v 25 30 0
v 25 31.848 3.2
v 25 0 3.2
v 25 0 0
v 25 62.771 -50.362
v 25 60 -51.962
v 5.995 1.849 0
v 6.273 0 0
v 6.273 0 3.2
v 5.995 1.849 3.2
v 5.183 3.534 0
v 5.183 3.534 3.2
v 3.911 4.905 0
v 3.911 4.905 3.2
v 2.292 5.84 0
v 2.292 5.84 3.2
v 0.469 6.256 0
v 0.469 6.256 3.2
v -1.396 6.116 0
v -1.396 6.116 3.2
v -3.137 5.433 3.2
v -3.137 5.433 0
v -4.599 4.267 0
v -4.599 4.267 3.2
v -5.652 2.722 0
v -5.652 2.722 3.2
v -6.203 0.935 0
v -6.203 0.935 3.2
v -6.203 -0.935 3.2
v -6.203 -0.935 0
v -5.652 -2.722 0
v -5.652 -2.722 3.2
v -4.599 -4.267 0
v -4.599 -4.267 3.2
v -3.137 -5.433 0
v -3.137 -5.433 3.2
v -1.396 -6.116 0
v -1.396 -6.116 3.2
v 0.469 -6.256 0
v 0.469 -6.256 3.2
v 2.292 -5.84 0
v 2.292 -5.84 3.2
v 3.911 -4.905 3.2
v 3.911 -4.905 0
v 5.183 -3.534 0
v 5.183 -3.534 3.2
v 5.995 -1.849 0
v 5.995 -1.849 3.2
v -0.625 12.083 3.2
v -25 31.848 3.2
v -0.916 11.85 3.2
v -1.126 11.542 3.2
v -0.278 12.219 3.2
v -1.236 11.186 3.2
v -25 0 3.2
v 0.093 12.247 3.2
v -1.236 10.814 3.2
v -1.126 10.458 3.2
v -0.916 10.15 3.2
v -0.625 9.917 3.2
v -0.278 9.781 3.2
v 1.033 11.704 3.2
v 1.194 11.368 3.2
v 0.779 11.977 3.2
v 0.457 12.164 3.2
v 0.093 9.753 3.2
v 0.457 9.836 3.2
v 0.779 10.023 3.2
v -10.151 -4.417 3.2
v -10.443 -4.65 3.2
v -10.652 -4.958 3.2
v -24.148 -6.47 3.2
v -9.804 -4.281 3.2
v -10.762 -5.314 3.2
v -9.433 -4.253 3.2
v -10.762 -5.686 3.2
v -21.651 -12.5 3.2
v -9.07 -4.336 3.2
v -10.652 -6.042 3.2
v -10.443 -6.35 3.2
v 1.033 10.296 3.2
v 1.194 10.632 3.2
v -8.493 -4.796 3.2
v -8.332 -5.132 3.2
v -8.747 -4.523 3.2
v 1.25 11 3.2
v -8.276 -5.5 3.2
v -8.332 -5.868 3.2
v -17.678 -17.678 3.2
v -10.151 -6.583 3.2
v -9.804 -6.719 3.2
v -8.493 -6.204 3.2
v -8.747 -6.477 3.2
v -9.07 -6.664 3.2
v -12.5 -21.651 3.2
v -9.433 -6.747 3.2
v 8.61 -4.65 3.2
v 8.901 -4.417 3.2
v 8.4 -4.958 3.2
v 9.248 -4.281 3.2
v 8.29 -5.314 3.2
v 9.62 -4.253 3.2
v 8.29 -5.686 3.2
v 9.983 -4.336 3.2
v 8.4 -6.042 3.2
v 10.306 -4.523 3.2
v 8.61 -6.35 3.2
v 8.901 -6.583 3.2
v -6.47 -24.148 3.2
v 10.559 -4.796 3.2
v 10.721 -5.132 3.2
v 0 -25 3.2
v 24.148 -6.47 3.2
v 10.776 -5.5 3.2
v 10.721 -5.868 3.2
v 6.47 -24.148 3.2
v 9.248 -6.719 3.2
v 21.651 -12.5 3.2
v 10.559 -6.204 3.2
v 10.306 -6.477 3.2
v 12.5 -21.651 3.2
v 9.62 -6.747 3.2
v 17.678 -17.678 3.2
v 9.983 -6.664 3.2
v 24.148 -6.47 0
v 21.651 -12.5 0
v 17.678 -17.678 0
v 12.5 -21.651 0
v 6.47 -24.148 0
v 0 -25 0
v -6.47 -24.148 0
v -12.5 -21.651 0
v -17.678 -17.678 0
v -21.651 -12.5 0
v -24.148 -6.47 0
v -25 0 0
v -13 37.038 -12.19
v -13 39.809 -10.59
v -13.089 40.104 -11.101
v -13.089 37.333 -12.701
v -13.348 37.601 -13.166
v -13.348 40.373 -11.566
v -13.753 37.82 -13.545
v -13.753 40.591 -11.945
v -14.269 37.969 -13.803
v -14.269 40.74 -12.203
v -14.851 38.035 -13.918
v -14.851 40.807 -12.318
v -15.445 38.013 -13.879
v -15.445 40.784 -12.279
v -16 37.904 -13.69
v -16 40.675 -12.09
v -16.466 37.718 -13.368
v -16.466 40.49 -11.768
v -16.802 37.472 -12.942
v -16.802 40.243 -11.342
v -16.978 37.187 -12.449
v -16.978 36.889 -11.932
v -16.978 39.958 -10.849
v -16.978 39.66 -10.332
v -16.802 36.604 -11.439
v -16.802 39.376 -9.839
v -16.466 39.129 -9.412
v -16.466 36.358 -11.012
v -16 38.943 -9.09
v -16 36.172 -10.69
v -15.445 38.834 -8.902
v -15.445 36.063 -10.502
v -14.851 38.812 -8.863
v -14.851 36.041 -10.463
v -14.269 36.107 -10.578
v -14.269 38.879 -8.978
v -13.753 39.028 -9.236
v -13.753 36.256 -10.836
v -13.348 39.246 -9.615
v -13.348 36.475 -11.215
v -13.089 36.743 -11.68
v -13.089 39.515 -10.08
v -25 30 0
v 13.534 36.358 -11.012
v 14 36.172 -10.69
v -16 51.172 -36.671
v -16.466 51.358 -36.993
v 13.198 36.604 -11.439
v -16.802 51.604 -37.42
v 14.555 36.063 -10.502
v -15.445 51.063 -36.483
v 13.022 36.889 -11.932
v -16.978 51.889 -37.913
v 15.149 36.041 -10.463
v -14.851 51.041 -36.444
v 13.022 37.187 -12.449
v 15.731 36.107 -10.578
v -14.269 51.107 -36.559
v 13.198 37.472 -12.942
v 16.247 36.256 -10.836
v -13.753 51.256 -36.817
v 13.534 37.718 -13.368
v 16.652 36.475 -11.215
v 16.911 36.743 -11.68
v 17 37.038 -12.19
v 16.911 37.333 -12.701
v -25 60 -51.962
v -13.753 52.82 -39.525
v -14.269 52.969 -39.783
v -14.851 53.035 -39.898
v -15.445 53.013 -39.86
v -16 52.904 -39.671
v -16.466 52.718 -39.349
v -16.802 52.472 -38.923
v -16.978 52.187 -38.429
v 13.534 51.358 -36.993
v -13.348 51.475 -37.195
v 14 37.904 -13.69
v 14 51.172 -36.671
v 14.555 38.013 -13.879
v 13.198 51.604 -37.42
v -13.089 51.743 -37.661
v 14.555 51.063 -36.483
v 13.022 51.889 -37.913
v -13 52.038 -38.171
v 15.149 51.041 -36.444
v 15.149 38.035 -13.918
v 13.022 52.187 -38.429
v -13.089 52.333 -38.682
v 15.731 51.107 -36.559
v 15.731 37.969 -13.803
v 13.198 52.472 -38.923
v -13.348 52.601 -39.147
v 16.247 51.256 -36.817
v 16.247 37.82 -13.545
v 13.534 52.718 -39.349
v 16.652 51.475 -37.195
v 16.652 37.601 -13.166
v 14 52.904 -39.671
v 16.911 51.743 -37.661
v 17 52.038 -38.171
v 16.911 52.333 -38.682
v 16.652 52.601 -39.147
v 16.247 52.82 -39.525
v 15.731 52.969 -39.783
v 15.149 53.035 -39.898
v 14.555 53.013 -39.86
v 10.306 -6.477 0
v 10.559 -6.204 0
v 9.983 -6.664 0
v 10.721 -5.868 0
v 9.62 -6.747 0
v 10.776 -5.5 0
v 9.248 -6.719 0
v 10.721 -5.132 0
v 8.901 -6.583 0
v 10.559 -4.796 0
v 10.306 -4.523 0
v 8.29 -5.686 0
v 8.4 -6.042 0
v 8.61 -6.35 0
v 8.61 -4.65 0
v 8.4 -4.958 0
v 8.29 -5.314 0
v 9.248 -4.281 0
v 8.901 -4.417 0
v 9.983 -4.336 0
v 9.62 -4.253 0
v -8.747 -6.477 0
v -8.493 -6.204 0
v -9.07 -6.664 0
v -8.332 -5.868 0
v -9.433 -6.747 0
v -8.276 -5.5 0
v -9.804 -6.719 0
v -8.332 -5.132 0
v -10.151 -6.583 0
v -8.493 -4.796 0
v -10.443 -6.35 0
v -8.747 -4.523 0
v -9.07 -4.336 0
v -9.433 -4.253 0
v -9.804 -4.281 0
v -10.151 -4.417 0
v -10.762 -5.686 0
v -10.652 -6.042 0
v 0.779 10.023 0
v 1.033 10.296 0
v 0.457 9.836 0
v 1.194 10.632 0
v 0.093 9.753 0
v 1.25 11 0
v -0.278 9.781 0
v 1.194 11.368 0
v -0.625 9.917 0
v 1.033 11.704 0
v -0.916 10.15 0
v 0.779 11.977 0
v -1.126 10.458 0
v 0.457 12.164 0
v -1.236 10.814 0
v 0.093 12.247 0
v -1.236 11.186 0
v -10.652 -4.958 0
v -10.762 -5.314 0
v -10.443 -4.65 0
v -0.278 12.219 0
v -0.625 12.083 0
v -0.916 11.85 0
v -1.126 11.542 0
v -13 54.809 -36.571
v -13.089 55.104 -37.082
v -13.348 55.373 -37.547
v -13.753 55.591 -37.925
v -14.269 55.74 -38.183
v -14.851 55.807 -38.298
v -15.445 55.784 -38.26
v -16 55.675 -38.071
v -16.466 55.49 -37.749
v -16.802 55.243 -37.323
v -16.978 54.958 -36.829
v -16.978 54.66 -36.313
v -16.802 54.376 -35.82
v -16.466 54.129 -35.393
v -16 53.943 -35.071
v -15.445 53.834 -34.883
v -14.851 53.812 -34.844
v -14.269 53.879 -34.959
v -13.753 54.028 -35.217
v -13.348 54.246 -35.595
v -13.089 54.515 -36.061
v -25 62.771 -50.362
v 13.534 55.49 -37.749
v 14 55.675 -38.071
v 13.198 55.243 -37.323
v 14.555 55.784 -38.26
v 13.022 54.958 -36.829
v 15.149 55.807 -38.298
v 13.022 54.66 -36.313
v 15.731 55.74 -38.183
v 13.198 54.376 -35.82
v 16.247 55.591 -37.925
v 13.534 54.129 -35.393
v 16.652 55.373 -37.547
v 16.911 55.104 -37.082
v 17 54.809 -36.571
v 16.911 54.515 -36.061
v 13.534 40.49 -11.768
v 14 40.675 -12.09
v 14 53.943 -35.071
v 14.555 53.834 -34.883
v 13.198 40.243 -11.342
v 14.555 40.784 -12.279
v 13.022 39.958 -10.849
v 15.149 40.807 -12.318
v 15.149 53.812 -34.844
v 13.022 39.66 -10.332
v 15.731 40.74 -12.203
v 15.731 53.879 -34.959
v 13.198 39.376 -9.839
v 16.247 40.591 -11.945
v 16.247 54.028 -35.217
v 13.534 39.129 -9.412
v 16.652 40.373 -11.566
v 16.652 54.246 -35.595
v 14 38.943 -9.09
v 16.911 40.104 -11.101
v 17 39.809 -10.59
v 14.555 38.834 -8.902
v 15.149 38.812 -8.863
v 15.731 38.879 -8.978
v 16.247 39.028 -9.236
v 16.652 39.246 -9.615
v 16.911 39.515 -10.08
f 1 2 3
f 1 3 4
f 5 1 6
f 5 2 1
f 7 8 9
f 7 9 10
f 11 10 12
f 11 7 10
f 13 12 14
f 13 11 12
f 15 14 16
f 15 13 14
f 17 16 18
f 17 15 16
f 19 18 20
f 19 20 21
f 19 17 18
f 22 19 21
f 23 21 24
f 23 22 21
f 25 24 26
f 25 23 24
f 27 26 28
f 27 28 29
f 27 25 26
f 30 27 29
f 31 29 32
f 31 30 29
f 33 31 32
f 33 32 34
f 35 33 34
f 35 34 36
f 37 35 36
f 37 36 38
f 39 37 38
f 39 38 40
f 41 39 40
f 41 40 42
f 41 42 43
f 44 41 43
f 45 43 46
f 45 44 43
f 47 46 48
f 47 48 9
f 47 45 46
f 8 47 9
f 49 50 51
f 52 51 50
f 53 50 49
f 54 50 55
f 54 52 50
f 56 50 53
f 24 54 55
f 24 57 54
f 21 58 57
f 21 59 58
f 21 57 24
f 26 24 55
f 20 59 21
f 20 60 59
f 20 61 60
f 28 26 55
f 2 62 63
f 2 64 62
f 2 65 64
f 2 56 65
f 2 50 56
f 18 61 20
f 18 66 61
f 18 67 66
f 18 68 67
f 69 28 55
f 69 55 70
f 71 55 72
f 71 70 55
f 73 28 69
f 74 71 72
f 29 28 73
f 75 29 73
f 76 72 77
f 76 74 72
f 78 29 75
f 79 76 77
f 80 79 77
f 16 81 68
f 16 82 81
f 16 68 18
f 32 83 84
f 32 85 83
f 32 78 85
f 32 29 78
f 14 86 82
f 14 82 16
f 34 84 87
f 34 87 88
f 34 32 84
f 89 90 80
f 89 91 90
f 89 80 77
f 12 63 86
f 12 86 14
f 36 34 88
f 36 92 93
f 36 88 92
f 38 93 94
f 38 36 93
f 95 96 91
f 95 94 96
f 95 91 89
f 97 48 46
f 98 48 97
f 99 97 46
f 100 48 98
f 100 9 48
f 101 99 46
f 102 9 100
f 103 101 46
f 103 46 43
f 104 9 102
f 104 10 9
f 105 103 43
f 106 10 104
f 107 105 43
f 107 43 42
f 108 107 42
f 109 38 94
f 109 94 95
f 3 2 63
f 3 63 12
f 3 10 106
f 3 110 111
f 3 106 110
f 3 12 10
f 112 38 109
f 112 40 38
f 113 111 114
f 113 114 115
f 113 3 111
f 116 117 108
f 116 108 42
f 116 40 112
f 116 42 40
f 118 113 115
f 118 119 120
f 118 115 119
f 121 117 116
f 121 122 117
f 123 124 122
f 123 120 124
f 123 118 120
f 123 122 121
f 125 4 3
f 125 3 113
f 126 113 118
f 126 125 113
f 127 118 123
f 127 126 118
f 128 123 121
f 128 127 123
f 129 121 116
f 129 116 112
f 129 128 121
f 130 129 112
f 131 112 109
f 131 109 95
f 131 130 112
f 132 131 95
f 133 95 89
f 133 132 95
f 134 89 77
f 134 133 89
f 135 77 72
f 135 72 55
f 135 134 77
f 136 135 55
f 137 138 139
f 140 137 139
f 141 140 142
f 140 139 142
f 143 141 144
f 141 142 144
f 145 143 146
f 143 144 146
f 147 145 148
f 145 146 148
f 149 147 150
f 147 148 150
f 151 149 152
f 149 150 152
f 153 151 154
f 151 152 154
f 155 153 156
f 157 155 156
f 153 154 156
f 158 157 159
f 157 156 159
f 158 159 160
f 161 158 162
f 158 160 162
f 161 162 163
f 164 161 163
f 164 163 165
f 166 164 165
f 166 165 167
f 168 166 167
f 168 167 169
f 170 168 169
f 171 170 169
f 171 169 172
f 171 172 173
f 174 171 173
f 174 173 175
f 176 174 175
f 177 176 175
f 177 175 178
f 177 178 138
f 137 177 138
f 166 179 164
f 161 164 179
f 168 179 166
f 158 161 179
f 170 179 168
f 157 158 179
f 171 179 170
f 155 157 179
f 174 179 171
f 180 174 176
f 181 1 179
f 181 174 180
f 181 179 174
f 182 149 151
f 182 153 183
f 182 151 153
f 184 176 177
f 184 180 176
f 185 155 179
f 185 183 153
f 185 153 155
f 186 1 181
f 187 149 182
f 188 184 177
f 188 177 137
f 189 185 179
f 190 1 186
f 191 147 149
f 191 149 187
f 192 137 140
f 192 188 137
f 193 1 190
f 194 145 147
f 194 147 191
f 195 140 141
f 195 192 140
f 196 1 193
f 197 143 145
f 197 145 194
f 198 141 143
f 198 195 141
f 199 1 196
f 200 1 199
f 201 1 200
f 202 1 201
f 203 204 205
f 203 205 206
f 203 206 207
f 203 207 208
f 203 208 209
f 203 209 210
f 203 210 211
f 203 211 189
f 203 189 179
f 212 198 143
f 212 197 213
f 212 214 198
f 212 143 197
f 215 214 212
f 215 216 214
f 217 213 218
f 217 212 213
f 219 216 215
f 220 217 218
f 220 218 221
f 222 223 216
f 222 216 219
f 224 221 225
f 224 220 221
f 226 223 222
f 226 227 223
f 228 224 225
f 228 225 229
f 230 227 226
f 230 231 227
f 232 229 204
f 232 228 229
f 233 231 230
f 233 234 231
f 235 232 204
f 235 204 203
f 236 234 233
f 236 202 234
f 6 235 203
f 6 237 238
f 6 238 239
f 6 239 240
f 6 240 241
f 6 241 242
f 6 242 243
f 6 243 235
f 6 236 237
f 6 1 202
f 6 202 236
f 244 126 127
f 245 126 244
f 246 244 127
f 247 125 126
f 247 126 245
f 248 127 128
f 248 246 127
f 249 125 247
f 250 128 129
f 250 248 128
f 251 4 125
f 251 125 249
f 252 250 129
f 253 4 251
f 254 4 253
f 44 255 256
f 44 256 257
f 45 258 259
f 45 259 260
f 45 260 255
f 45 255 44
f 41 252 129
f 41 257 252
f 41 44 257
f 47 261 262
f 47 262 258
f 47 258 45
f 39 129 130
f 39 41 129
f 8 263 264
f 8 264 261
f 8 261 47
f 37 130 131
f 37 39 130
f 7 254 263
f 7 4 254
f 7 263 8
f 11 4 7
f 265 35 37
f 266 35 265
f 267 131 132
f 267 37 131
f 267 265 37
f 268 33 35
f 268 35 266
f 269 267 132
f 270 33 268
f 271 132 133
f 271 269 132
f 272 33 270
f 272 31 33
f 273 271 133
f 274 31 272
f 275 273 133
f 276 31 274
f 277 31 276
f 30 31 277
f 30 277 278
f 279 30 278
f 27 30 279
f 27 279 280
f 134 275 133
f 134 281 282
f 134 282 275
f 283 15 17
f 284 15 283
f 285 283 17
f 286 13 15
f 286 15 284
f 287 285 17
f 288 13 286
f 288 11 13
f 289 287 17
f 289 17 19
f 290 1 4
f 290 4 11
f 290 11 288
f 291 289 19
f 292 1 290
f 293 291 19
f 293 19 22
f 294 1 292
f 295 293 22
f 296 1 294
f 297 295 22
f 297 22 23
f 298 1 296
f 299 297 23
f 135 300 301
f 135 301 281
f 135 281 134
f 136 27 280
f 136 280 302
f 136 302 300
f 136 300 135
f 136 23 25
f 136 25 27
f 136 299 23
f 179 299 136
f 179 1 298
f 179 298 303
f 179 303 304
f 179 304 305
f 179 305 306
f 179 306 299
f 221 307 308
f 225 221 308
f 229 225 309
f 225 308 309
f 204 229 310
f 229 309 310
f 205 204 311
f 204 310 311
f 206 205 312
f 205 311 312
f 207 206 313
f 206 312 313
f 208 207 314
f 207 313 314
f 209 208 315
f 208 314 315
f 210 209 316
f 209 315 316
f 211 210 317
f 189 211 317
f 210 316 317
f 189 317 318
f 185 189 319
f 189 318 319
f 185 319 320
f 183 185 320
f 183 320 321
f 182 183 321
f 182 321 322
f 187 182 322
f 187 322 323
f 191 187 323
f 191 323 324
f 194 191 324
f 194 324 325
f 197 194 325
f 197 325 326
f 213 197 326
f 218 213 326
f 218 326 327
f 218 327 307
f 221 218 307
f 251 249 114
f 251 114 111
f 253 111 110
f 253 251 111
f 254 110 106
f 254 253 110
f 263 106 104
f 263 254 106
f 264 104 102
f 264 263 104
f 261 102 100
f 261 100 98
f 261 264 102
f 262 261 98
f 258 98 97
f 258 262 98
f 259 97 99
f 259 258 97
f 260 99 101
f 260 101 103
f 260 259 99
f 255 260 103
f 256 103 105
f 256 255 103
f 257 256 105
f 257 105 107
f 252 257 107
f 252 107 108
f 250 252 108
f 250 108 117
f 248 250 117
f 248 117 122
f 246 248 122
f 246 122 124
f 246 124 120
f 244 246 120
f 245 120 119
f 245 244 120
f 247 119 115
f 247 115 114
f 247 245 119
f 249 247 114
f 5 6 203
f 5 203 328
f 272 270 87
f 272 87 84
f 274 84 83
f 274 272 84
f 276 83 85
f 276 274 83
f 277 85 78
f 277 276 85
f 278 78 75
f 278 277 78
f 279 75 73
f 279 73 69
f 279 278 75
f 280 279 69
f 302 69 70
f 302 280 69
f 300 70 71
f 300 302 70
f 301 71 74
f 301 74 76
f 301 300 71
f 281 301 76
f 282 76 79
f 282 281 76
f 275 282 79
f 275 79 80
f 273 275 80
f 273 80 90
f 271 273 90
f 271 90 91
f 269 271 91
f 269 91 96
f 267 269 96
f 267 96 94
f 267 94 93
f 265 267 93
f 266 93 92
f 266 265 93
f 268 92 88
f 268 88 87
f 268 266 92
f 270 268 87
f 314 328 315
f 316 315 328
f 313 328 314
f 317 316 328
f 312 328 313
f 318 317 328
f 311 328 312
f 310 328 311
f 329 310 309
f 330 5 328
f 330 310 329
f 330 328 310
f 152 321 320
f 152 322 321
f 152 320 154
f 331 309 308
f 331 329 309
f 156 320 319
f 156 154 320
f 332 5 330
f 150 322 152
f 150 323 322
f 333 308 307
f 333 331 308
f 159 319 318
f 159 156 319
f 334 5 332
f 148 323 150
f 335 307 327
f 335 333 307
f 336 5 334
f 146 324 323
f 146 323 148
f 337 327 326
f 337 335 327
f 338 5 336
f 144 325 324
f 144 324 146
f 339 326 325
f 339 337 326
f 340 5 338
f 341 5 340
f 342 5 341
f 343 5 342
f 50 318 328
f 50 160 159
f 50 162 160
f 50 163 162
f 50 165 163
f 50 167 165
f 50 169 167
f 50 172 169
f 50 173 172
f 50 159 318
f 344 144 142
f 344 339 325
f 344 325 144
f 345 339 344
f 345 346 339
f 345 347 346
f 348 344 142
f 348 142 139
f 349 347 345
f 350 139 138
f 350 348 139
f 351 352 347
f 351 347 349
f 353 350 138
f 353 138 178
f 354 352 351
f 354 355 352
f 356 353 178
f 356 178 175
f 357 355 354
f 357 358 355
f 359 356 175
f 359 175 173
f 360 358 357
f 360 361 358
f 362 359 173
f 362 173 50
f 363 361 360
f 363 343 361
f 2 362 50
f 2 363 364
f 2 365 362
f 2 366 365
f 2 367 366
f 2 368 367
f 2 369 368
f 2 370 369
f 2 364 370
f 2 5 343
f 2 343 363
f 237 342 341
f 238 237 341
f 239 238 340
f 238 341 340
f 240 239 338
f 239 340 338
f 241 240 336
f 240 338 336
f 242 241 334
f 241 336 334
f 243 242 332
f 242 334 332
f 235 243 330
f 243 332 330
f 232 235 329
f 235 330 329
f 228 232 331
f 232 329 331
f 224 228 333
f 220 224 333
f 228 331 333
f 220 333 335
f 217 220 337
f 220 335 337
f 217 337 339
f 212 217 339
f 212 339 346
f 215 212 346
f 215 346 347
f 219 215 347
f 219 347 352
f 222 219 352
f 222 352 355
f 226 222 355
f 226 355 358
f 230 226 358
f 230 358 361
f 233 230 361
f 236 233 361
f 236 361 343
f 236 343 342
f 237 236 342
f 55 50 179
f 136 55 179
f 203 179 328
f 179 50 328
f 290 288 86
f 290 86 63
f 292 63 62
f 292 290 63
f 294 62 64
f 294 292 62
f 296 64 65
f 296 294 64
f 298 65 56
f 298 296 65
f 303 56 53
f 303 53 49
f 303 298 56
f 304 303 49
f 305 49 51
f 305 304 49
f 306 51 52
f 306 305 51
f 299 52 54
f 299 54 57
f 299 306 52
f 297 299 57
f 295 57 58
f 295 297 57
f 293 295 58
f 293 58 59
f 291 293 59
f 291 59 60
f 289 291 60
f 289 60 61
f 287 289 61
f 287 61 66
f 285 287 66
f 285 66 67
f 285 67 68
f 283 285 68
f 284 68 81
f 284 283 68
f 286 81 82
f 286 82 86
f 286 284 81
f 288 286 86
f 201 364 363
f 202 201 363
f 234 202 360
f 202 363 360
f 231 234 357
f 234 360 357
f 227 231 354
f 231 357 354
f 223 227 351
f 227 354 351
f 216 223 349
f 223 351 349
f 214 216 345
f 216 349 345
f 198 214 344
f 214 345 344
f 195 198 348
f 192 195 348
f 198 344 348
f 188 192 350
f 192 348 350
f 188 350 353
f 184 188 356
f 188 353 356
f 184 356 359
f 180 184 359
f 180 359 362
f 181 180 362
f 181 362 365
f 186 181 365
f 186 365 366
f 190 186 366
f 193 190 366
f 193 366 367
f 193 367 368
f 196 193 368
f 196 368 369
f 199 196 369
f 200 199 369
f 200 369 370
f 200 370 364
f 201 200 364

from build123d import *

# Parameters (mm, degrees)
SKETCH1_R           = 6.273243026
SKETCH1_R_2         = 1.25
BOSS_EXTRUDE1_DEPTH = 3.2
BOSS_EXTRUDE2_DEPTH = 50
CUT_EXTRUDE1_REACH  = 78.812
SKETCH3_R           = 2


with BuildPart() as part:
    # Sketch1 → Boss-Extrude1 (new body)
    with BuildSketch(Plane.XY):
        with BuildLine():
            Line((-25, 0), (-25, 30))
            Line((-25, 30), (25, 30))
            Line((25, 30), (25, 0))
            ThreePointArc((25, 0), (0, -25), (-25, 0))
        make_face()
        Circle(SKETCH1_R, mode=Mode.SUBTRACT)
        with Locations((0, 11)):
            Circle(SKETCH1_R_2, mode=Mode.SUBTRACT)
        with Locations((9.526279442, -5.5)):
            Circle(SKETCH1_R_2, mode=Mode.SUBTRACT)
        with Locations((-9.526279442, -5.5)):
            Circle(SKETCH1_R_2, mode=Mode.SUBTRACT)
    extrude(amount=BOSS_EXTRUDE1_DEPTH)

    # Sketch2 → Boss-Extrude2 (add)
    with BuildSketch(Plane(origin=(25, 0, 0), x_dir=(0, 0, -1), z_dir=(1, 0, 0))):
        Polygon((0, 30), (51.961524227, 60), (50.361524227, 62.771281292), (-3.2, 31.847520861), (-3.2, 30), align=None)
    extrude(amount=-BOSS_EXTRUDE2_DEPTH)

    # Sketch3 → Cut-Extrude1 (cut, up to next)
    with BuildSketch(Plane(origin=(0, 25.271281292, 14.590381057), x_dir=(1, 0, 0), z_dir=(0, 0.866025404, 0.5)), mode=Mode.PRIVATE) as cut_extrude1_sk1:
        with Locations((15, 59.076239569)):
            Circle(SKETCH3_R)
    cut_extrude1_tool1 = extrude(cut_extrude1_sk1.sketch, amount=-CUT_EXTRUDE1_REACH, mode=Mode.PRIVATE) & part.part
    add(cut_extrude1_tool1.solids().sort_by_distance((15, 54.809401, -36.571143))[0], mode=Mode.SUBTRACT)
    # Sketch3 → Cut-Extrude1 (cut, up to next)
    with BuildSketch(Plane(origin=(0, 25.271281292, 14.590381057), x_dir=(1, 0, 0), z_dir=(0, 0.866025404, 0.5)), mode=Mode.PRIVATE) as cut_extrude1_sk2:
        with Locations((15, 29.076239569)):
            Circle(SKETCH3_R)
    cut_extrude1_tool2 = extrude(cut_extrude1_sk2.sketch, amount=-CUT_EXTRUDE1_REACH, mode=Mode.PRIVATE) & part.part
    add(cut_extrude1_tool2.solids().sort_by_distance((15, 39.809401, -10.590381))[0], mode=Mode.SUBTRACT)
    # Sketch3 → Cut-Extrude1 (cut, up to next)
    with BuildSketch(Plane(origin=(0, 25.271281292, 14.590381057), x_dir=(1, 0, 0), z_dir=(0, 0.866025404, 0.5)), mode=Mode.PRIVATE) as cut_extrude1_sk3:
        with Locations((-15, 59.076239569)):
            Circle(SKETCH3_R)
    cut_extrude1_tool3 = extrude(cut_extrude1_sk3.sketch, amount=-CUT_EXTRUDE1_REACH, mode=Mode.PRIVATE) & part.part
    add(cut_extrude1_tool3.solids().sort_by_distance((-15, 54.809401, -36.571143))[0], mode=Mode.SUBTRACT)
    # Sketch3 → Cut-Extrude1 (cut, up to next)
    with BuildSketch(Plane(origin=(0, 25.271281292, 14.590381057), x_dir=(1, 0, 0), z_dir=(0, 0.866025404, 0.5)), mode=Mode.PRIVATE) as cut_extrude1_sk4:
        with Locations((-15, 29.076239569)):
            Circle(SKETCH3_R)
    cut_extrude1_tool4 = extrude(cut_extrude1_sk4.sketch, amount=-CUT_EXTRUDE1_REACH, mode=Mode.PRIVATE) & part.part
    add(cut_extrude1_tool4.solids().sort_by_distance((-15, 39.809401, -10.590381))[0], mode=Mode.SUBTRACT)


solid = part.part
